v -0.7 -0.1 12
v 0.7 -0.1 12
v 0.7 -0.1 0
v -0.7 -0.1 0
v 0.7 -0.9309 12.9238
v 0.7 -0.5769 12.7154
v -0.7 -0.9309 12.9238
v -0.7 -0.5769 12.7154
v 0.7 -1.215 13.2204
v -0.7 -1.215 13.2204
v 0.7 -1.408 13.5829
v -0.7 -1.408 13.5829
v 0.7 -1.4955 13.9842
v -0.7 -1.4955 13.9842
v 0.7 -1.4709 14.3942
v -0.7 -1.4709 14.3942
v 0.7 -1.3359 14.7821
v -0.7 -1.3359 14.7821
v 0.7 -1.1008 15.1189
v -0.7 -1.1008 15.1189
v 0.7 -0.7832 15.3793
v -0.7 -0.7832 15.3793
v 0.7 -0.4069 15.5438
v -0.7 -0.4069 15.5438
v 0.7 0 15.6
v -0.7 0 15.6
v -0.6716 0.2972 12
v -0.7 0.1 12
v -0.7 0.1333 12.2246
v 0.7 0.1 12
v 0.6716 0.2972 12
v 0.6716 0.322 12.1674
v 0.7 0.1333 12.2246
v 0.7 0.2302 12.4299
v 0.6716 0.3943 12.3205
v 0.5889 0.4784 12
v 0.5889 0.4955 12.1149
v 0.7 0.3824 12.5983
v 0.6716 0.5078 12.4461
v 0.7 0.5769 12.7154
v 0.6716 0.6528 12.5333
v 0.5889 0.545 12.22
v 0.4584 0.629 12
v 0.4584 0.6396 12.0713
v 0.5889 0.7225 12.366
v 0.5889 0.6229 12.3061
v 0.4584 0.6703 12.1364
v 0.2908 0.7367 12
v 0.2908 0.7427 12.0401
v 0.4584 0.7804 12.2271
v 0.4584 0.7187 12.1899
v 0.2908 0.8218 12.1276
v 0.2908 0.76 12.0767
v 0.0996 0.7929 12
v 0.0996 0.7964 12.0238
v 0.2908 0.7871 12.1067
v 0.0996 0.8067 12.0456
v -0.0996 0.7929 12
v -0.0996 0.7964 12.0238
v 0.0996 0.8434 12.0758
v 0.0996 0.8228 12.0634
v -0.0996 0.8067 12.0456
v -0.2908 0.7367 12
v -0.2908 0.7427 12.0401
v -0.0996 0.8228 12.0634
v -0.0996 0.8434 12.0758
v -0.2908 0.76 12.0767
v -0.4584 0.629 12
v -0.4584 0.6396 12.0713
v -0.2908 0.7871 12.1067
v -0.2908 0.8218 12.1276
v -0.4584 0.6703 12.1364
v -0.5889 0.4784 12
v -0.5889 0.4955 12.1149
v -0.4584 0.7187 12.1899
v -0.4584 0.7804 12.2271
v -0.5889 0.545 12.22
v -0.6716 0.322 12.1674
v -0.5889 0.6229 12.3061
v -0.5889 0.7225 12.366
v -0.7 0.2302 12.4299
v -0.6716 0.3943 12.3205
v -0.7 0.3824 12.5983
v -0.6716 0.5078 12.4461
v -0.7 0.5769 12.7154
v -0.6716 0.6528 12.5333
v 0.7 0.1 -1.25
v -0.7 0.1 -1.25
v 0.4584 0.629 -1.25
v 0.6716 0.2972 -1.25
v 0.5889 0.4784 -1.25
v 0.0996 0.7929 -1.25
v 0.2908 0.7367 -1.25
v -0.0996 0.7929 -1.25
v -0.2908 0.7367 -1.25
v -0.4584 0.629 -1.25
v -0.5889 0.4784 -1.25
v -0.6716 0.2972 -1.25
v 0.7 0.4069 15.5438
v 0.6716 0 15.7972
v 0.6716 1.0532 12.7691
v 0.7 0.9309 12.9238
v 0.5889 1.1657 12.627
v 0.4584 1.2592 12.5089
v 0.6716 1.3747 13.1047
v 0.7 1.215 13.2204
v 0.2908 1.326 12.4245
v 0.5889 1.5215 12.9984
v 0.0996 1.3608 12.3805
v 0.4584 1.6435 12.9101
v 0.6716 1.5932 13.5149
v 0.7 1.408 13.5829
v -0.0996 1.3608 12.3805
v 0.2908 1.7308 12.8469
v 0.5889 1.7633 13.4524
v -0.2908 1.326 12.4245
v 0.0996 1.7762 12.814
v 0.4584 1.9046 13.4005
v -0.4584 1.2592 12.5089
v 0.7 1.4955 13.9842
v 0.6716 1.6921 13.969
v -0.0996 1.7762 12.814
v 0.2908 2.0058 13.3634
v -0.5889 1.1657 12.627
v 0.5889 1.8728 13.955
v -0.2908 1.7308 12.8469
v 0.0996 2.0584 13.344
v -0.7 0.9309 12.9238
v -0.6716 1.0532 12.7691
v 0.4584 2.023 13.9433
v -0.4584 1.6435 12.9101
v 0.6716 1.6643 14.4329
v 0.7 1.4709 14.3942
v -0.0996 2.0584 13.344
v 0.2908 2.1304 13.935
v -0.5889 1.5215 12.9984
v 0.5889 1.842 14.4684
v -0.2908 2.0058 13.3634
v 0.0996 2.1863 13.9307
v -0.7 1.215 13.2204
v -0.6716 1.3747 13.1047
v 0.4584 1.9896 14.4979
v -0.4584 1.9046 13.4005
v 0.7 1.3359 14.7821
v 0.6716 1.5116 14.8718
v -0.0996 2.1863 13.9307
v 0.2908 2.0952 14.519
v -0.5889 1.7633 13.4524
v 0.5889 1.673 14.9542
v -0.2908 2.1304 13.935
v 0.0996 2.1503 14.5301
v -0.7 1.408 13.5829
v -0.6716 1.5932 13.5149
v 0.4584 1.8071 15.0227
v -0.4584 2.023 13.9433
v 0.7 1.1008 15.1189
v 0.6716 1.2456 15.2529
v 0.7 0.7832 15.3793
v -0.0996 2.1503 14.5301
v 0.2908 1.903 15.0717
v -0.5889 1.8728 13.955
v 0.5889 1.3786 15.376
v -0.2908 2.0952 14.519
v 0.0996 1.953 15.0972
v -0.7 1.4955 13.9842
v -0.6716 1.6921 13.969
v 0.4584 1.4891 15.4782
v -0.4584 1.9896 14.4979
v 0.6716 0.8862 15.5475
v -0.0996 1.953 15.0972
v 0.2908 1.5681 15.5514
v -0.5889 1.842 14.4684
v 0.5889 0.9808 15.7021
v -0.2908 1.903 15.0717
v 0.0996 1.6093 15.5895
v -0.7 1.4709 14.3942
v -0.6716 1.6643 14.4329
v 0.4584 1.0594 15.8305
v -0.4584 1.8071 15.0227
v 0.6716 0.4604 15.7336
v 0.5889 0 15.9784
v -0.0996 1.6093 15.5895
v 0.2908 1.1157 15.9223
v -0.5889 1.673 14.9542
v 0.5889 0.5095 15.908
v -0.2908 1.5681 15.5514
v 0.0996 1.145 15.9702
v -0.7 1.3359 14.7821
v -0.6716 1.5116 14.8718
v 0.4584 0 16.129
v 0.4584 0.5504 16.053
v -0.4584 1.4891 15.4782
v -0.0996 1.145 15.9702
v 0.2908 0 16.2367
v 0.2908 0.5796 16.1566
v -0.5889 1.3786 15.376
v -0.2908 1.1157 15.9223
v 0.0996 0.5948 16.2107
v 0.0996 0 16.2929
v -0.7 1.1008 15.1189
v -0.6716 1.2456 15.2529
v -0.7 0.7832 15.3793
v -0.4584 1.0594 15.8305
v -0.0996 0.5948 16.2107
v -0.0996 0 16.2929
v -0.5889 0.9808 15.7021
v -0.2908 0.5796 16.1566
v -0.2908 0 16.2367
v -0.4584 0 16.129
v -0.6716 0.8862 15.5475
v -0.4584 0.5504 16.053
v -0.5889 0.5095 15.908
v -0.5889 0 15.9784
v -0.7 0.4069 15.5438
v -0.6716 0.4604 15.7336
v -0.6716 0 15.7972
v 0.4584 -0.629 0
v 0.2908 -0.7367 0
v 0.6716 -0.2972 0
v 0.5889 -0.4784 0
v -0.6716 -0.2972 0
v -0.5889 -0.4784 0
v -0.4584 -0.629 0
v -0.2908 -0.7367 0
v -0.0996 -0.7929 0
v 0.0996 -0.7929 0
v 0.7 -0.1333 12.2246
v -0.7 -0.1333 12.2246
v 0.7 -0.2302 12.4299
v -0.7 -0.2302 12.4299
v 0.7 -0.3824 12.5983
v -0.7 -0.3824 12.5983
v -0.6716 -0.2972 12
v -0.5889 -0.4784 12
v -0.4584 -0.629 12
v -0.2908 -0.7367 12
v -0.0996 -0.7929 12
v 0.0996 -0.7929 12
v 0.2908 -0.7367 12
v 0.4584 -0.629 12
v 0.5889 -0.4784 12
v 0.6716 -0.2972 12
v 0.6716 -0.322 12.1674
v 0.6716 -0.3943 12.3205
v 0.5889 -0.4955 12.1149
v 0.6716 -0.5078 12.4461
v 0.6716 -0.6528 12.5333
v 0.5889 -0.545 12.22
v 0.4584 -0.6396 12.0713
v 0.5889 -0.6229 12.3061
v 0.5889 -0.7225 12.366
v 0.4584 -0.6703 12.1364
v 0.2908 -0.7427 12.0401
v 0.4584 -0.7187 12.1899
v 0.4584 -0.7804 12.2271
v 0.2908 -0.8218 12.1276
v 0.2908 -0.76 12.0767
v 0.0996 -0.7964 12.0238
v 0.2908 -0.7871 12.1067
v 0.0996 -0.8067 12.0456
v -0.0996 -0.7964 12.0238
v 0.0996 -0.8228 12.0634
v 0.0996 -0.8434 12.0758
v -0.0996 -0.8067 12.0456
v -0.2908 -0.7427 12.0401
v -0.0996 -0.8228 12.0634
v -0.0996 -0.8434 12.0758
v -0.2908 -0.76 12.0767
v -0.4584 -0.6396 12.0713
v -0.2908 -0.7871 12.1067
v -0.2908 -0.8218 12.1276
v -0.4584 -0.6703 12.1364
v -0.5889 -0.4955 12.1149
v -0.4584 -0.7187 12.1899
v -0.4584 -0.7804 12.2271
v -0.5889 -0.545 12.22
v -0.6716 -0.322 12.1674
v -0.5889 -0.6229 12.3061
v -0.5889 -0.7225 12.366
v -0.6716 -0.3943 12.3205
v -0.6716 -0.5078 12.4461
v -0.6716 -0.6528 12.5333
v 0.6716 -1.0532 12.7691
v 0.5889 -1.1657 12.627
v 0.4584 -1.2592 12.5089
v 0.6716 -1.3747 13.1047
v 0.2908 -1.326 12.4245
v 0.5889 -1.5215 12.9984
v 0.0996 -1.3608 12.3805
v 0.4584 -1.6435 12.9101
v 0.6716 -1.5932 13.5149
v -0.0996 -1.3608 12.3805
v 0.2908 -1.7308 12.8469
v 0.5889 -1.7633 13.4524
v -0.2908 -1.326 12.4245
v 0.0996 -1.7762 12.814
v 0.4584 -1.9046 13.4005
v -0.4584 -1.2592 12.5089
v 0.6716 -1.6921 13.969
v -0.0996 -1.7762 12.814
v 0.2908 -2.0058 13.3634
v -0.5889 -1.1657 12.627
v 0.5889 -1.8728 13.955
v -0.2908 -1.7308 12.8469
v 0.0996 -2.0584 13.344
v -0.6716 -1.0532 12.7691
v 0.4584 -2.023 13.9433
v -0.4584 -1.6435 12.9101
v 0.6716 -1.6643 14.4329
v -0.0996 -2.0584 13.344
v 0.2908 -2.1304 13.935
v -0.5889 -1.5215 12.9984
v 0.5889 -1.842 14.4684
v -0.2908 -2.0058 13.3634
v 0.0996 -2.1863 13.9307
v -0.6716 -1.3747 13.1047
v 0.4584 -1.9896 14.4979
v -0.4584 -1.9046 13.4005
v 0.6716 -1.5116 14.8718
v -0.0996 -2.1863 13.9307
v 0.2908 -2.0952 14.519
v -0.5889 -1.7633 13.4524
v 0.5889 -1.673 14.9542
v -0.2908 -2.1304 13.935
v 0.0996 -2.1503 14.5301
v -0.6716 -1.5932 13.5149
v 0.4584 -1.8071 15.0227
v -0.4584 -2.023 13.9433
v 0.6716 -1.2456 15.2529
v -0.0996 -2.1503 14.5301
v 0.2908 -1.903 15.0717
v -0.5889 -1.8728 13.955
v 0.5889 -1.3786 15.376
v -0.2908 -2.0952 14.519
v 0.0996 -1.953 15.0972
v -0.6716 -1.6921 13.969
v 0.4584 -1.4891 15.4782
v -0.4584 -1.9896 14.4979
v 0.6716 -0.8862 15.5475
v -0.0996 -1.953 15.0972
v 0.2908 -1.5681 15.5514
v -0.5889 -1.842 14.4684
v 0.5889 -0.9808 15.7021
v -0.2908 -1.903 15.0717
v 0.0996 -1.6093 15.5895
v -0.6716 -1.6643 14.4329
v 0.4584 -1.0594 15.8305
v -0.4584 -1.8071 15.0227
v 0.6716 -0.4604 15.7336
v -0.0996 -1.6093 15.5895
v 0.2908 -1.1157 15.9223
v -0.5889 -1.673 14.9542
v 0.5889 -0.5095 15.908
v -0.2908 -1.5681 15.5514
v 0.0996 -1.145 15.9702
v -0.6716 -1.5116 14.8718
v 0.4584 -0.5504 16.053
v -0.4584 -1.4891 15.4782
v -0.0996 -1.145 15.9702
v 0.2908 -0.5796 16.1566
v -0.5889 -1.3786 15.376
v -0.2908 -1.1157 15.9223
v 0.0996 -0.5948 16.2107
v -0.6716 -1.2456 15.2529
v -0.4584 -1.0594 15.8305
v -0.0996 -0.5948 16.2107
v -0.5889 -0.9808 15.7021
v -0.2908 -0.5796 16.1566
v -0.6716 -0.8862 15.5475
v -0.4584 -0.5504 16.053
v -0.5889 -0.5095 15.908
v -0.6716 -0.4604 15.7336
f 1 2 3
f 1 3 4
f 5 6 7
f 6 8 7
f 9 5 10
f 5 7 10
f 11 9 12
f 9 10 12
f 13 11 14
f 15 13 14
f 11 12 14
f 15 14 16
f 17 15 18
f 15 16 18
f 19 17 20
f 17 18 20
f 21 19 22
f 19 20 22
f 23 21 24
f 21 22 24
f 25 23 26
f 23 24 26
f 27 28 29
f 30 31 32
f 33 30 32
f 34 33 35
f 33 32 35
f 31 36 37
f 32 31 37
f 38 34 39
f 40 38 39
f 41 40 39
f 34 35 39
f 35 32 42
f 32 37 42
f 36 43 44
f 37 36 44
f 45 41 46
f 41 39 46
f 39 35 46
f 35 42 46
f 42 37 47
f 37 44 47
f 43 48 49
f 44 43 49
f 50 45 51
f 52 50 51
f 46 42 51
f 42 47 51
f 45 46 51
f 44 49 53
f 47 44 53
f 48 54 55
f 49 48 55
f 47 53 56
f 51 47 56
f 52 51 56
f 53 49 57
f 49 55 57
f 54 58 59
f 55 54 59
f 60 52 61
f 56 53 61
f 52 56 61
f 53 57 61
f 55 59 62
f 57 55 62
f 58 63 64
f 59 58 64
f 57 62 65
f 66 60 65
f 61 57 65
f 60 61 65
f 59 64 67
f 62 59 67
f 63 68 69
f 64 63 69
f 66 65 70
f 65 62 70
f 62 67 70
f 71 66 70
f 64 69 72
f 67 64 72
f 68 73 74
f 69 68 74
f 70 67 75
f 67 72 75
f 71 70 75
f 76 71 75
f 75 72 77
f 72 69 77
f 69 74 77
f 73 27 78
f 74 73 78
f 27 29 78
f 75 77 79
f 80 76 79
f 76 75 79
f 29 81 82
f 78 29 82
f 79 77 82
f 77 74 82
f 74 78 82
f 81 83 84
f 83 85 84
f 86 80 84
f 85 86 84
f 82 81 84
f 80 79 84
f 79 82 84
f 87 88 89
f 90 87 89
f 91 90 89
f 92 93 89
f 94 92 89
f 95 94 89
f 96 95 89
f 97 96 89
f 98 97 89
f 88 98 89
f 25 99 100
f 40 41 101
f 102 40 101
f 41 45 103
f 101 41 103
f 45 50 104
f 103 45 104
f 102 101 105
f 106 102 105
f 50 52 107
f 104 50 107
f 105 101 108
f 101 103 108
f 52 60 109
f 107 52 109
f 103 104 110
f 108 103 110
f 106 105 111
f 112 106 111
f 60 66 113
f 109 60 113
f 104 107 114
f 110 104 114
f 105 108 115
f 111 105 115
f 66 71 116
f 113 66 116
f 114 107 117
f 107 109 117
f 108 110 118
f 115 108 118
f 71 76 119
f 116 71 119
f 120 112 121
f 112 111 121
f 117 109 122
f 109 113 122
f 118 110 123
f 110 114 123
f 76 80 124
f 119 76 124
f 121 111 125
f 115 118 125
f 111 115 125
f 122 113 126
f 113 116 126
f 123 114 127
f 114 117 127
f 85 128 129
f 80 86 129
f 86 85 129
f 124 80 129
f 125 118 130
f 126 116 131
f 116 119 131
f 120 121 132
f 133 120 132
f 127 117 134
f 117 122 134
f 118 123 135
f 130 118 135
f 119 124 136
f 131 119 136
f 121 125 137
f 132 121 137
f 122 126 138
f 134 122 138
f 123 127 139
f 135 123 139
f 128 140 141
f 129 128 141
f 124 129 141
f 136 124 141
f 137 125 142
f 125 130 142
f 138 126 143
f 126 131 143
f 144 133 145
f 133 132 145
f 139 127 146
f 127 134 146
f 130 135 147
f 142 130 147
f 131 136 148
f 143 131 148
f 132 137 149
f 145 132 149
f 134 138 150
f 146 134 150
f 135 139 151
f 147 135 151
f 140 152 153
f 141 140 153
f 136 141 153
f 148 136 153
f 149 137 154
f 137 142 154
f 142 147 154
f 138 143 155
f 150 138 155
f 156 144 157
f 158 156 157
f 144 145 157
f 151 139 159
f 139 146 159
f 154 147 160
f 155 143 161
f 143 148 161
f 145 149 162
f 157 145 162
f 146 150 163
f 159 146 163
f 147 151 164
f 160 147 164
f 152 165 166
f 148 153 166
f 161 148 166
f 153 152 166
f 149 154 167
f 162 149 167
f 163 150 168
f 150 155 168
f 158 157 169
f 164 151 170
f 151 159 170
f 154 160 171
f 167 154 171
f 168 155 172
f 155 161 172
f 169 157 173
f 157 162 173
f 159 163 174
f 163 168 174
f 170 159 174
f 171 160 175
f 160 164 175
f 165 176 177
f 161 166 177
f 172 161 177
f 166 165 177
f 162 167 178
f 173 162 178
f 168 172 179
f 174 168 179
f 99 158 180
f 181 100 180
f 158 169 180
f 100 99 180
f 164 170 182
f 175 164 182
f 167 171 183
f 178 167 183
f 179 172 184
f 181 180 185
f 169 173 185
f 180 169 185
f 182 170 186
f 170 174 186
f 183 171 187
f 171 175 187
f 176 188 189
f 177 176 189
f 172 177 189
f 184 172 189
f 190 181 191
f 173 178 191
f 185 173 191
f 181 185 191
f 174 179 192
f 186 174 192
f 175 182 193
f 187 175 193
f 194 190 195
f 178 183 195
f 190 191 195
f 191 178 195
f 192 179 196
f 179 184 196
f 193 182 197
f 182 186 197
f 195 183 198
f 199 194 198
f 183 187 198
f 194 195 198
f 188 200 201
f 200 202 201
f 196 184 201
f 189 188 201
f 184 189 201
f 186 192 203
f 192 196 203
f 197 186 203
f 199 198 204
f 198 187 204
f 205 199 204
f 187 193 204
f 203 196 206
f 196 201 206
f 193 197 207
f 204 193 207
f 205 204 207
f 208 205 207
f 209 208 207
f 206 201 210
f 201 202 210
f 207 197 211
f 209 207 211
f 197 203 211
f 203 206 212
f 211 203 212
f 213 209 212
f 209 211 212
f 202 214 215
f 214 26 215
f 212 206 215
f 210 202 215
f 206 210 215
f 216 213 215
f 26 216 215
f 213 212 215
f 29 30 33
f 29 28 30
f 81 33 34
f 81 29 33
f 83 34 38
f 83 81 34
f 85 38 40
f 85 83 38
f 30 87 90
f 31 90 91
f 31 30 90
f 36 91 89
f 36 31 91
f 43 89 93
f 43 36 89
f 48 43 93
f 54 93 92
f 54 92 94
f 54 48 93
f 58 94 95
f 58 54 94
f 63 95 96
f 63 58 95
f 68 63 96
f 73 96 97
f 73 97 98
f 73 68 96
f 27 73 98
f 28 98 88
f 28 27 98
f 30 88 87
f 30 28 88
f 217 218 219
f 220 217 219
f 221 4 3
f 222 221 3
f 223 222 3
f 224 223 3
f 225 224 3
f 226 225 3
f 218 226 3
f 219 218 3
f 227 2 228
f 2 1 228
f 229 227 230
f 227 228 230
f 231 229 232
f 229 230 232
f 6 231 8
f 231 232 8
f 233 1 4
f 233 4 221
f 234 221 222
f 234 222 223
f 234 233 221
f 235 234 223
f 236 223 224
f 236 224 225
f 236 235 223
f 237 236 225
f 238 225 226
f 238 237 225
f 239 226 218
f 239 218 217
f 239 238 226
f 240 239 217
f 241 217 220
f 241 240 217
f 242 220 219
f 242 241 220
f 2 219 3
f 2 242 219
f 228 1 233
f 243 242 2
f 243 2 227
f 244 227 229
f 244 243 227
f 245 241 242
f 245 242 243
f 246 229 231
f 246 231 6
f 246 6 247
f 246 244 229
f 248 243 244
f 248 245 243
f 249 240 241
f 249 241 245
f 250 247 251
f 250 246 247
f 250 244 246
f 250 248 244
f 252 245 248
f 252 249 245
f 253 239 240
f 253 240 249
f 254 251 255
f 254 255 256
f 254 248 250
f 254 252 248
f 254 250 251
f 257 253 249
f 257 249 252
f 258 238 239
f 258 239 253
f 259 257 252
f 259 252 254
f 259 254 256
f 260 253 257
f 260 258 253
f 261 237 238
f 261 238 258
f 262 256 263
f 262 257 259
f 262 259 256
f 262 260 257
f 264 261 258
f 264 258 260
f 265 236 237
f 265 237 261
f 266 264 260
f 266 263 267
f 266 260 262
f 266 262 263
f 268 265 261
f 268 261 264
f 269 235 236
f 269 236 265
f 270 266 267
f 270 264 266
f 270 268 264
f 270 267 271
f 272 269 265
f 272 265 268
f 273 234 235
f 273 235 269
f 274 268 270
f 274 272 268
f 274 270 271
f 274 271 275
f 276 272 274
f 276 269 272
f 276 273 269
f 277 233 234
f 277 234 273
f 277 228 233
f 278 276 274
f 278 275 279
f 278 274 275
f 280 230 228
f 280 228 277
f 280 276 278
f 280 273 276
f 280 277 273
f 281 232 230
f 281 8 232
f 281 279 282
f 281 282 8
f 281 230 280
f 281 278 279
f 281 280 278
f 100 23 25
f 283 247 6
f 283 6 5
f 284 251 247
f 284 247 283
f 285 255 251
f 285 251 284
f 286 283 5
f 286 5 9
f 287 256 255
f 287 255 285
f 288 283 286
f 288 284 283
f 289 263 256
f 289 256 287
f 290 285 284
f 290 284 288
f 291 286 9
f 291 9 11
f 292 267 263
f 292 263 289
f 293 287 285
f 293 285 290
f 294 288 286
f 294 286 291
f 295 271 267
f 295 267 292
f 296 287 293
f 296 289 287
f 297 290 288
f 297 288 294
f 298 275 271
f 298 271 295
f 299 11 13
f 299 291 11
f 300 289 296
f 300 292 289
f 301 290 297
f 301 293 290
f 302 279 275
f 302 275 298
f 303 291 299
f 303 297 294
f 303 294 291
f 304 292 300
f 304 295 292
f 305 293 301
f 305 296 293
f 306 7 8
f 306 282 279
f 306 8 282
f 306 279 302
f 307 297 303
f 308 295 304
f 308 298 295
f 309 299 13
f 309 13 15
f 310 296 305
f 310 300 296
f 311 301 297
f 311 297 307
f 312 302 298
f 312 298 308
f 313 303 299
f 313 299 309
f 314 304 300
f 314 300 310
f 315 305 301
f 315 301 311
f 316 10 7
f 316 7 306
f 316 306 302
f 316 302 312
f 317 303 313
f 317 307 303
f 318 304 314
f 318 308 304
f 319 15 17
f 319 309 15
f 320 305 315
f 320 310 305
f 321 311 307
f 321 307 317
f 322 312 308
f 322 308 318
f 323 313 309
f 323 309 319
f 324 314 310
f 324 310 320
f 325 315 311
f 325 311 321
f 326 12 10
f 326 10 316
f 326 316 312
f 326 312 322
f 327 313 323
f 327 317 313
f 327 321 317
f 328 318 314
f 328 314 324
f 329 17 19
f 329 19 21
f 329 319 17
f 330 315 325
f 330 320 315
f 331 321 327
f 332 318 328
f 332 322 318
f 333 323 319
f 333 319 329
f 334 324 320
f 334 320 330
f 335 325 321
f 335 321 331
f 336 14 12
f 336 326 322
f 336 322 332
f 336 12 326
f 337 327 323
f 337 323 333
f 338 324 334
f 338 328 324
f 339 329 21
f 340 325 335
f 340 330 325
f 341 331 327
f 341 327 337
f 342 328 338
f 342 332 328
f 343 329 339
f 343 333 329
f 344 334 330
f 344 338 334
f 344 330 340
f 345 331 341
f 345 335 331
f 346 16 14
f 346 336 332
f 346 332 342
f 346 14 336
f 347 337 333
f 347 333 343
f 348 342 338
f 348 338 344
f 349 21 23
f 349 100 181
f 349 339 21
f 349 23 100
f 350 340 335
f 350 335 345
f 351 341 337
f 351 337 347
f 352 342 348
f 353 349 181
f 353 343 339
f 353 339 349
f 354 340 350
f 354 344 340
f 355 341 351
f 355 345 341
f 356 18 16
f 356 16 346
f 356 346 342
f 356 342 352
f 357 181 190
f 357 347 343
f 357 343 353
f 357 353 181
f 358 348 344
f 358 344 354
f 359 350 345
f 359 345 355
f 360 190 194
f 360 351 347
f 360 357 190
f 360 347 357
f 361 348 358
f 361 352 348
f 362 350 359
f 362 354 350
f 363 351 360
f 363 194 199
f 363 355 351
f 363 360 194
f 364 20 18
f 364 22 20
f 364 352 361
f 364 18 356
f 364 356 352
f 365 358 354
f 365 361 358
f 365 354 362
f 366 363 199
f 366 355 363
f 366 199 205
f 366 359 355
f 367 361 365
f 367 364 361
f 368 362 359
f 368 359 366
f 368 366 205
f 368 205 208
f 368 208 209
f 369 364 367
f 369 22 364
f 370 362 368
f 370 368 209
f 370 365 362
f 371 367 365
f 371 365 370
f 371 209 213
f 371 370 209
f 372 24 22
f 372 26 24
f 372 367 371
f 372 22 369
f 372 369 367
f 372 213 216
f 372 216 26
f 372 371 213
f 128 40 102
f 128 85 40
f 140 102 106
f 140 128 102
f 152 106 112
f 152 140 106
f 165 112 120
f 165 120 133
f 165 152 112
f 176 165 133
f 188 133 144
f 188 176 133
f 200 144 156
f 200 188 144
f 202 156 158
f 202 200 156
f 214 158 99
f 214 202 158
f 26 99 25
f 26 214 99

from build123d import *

# Parameters (mm, degrees)
DODANIE_WYCI_GNI_CIE1_DEPTH = 1.25


with BuildPart() as part:
    # Wyciągnięcie po ścieżce1: sweep along a path in Szkic1
    with BuildLine(Plane(origin=(0, 0, 0), x_dir=(0, 0, -1), z_dir=(1, 0, 0))) as wyci_gni_cie_po_cie_ce1_path:
        Line((0, 0), (-12, 0))
        ThreePointArc((-12, 0), (-12.485362672, -0.146955992), (-12.807692308, -0.538461538))
        ThreePointArc((-12.807692308, -0.538461538), (-14.374562589, -1.372812946), (-15.5, 0))
    # Szkic2 → Wyciągnięcie po ścieżce1 (sweep)
    with BuildSketch(Plane.XY):
        with BuildLine():
            Line((-0.7, -0.1), (0.7, -0.1))
            ThreePointArc((0.7, -0.1), (0, -0.8), (-0.7, -0.1))
        make_face()
    wyci_gni_cie_po_cie_ce1 = sweep(path=wyci_gni_cie_po_cie_ce1_path.line)

    # Lustro1: Wyciągnięcie po ścieżce1 across plane
    add(wyci_gni_cie_po_cie_ce1.mirror(Plane.ZX))

    # Szkic3 → Dodanie-wyciągnięcie1 (add)
    with BuildSketch(Plane(origin=(0, 0, 0), x_dir=(-1, 0, 0), z_dir=(0, 0, -1))):
        with BuildLine():
            Line((0.7, 0.1), (-0.7, 0.1))
            ThreePointArc((-0.7, 0.1), (0, 0.8), (0.7, 0.1))
        make_face()
    extrude(amount=DODANIE_WYCI_GNI_CIE1_DEPTH)


solid = part.part
